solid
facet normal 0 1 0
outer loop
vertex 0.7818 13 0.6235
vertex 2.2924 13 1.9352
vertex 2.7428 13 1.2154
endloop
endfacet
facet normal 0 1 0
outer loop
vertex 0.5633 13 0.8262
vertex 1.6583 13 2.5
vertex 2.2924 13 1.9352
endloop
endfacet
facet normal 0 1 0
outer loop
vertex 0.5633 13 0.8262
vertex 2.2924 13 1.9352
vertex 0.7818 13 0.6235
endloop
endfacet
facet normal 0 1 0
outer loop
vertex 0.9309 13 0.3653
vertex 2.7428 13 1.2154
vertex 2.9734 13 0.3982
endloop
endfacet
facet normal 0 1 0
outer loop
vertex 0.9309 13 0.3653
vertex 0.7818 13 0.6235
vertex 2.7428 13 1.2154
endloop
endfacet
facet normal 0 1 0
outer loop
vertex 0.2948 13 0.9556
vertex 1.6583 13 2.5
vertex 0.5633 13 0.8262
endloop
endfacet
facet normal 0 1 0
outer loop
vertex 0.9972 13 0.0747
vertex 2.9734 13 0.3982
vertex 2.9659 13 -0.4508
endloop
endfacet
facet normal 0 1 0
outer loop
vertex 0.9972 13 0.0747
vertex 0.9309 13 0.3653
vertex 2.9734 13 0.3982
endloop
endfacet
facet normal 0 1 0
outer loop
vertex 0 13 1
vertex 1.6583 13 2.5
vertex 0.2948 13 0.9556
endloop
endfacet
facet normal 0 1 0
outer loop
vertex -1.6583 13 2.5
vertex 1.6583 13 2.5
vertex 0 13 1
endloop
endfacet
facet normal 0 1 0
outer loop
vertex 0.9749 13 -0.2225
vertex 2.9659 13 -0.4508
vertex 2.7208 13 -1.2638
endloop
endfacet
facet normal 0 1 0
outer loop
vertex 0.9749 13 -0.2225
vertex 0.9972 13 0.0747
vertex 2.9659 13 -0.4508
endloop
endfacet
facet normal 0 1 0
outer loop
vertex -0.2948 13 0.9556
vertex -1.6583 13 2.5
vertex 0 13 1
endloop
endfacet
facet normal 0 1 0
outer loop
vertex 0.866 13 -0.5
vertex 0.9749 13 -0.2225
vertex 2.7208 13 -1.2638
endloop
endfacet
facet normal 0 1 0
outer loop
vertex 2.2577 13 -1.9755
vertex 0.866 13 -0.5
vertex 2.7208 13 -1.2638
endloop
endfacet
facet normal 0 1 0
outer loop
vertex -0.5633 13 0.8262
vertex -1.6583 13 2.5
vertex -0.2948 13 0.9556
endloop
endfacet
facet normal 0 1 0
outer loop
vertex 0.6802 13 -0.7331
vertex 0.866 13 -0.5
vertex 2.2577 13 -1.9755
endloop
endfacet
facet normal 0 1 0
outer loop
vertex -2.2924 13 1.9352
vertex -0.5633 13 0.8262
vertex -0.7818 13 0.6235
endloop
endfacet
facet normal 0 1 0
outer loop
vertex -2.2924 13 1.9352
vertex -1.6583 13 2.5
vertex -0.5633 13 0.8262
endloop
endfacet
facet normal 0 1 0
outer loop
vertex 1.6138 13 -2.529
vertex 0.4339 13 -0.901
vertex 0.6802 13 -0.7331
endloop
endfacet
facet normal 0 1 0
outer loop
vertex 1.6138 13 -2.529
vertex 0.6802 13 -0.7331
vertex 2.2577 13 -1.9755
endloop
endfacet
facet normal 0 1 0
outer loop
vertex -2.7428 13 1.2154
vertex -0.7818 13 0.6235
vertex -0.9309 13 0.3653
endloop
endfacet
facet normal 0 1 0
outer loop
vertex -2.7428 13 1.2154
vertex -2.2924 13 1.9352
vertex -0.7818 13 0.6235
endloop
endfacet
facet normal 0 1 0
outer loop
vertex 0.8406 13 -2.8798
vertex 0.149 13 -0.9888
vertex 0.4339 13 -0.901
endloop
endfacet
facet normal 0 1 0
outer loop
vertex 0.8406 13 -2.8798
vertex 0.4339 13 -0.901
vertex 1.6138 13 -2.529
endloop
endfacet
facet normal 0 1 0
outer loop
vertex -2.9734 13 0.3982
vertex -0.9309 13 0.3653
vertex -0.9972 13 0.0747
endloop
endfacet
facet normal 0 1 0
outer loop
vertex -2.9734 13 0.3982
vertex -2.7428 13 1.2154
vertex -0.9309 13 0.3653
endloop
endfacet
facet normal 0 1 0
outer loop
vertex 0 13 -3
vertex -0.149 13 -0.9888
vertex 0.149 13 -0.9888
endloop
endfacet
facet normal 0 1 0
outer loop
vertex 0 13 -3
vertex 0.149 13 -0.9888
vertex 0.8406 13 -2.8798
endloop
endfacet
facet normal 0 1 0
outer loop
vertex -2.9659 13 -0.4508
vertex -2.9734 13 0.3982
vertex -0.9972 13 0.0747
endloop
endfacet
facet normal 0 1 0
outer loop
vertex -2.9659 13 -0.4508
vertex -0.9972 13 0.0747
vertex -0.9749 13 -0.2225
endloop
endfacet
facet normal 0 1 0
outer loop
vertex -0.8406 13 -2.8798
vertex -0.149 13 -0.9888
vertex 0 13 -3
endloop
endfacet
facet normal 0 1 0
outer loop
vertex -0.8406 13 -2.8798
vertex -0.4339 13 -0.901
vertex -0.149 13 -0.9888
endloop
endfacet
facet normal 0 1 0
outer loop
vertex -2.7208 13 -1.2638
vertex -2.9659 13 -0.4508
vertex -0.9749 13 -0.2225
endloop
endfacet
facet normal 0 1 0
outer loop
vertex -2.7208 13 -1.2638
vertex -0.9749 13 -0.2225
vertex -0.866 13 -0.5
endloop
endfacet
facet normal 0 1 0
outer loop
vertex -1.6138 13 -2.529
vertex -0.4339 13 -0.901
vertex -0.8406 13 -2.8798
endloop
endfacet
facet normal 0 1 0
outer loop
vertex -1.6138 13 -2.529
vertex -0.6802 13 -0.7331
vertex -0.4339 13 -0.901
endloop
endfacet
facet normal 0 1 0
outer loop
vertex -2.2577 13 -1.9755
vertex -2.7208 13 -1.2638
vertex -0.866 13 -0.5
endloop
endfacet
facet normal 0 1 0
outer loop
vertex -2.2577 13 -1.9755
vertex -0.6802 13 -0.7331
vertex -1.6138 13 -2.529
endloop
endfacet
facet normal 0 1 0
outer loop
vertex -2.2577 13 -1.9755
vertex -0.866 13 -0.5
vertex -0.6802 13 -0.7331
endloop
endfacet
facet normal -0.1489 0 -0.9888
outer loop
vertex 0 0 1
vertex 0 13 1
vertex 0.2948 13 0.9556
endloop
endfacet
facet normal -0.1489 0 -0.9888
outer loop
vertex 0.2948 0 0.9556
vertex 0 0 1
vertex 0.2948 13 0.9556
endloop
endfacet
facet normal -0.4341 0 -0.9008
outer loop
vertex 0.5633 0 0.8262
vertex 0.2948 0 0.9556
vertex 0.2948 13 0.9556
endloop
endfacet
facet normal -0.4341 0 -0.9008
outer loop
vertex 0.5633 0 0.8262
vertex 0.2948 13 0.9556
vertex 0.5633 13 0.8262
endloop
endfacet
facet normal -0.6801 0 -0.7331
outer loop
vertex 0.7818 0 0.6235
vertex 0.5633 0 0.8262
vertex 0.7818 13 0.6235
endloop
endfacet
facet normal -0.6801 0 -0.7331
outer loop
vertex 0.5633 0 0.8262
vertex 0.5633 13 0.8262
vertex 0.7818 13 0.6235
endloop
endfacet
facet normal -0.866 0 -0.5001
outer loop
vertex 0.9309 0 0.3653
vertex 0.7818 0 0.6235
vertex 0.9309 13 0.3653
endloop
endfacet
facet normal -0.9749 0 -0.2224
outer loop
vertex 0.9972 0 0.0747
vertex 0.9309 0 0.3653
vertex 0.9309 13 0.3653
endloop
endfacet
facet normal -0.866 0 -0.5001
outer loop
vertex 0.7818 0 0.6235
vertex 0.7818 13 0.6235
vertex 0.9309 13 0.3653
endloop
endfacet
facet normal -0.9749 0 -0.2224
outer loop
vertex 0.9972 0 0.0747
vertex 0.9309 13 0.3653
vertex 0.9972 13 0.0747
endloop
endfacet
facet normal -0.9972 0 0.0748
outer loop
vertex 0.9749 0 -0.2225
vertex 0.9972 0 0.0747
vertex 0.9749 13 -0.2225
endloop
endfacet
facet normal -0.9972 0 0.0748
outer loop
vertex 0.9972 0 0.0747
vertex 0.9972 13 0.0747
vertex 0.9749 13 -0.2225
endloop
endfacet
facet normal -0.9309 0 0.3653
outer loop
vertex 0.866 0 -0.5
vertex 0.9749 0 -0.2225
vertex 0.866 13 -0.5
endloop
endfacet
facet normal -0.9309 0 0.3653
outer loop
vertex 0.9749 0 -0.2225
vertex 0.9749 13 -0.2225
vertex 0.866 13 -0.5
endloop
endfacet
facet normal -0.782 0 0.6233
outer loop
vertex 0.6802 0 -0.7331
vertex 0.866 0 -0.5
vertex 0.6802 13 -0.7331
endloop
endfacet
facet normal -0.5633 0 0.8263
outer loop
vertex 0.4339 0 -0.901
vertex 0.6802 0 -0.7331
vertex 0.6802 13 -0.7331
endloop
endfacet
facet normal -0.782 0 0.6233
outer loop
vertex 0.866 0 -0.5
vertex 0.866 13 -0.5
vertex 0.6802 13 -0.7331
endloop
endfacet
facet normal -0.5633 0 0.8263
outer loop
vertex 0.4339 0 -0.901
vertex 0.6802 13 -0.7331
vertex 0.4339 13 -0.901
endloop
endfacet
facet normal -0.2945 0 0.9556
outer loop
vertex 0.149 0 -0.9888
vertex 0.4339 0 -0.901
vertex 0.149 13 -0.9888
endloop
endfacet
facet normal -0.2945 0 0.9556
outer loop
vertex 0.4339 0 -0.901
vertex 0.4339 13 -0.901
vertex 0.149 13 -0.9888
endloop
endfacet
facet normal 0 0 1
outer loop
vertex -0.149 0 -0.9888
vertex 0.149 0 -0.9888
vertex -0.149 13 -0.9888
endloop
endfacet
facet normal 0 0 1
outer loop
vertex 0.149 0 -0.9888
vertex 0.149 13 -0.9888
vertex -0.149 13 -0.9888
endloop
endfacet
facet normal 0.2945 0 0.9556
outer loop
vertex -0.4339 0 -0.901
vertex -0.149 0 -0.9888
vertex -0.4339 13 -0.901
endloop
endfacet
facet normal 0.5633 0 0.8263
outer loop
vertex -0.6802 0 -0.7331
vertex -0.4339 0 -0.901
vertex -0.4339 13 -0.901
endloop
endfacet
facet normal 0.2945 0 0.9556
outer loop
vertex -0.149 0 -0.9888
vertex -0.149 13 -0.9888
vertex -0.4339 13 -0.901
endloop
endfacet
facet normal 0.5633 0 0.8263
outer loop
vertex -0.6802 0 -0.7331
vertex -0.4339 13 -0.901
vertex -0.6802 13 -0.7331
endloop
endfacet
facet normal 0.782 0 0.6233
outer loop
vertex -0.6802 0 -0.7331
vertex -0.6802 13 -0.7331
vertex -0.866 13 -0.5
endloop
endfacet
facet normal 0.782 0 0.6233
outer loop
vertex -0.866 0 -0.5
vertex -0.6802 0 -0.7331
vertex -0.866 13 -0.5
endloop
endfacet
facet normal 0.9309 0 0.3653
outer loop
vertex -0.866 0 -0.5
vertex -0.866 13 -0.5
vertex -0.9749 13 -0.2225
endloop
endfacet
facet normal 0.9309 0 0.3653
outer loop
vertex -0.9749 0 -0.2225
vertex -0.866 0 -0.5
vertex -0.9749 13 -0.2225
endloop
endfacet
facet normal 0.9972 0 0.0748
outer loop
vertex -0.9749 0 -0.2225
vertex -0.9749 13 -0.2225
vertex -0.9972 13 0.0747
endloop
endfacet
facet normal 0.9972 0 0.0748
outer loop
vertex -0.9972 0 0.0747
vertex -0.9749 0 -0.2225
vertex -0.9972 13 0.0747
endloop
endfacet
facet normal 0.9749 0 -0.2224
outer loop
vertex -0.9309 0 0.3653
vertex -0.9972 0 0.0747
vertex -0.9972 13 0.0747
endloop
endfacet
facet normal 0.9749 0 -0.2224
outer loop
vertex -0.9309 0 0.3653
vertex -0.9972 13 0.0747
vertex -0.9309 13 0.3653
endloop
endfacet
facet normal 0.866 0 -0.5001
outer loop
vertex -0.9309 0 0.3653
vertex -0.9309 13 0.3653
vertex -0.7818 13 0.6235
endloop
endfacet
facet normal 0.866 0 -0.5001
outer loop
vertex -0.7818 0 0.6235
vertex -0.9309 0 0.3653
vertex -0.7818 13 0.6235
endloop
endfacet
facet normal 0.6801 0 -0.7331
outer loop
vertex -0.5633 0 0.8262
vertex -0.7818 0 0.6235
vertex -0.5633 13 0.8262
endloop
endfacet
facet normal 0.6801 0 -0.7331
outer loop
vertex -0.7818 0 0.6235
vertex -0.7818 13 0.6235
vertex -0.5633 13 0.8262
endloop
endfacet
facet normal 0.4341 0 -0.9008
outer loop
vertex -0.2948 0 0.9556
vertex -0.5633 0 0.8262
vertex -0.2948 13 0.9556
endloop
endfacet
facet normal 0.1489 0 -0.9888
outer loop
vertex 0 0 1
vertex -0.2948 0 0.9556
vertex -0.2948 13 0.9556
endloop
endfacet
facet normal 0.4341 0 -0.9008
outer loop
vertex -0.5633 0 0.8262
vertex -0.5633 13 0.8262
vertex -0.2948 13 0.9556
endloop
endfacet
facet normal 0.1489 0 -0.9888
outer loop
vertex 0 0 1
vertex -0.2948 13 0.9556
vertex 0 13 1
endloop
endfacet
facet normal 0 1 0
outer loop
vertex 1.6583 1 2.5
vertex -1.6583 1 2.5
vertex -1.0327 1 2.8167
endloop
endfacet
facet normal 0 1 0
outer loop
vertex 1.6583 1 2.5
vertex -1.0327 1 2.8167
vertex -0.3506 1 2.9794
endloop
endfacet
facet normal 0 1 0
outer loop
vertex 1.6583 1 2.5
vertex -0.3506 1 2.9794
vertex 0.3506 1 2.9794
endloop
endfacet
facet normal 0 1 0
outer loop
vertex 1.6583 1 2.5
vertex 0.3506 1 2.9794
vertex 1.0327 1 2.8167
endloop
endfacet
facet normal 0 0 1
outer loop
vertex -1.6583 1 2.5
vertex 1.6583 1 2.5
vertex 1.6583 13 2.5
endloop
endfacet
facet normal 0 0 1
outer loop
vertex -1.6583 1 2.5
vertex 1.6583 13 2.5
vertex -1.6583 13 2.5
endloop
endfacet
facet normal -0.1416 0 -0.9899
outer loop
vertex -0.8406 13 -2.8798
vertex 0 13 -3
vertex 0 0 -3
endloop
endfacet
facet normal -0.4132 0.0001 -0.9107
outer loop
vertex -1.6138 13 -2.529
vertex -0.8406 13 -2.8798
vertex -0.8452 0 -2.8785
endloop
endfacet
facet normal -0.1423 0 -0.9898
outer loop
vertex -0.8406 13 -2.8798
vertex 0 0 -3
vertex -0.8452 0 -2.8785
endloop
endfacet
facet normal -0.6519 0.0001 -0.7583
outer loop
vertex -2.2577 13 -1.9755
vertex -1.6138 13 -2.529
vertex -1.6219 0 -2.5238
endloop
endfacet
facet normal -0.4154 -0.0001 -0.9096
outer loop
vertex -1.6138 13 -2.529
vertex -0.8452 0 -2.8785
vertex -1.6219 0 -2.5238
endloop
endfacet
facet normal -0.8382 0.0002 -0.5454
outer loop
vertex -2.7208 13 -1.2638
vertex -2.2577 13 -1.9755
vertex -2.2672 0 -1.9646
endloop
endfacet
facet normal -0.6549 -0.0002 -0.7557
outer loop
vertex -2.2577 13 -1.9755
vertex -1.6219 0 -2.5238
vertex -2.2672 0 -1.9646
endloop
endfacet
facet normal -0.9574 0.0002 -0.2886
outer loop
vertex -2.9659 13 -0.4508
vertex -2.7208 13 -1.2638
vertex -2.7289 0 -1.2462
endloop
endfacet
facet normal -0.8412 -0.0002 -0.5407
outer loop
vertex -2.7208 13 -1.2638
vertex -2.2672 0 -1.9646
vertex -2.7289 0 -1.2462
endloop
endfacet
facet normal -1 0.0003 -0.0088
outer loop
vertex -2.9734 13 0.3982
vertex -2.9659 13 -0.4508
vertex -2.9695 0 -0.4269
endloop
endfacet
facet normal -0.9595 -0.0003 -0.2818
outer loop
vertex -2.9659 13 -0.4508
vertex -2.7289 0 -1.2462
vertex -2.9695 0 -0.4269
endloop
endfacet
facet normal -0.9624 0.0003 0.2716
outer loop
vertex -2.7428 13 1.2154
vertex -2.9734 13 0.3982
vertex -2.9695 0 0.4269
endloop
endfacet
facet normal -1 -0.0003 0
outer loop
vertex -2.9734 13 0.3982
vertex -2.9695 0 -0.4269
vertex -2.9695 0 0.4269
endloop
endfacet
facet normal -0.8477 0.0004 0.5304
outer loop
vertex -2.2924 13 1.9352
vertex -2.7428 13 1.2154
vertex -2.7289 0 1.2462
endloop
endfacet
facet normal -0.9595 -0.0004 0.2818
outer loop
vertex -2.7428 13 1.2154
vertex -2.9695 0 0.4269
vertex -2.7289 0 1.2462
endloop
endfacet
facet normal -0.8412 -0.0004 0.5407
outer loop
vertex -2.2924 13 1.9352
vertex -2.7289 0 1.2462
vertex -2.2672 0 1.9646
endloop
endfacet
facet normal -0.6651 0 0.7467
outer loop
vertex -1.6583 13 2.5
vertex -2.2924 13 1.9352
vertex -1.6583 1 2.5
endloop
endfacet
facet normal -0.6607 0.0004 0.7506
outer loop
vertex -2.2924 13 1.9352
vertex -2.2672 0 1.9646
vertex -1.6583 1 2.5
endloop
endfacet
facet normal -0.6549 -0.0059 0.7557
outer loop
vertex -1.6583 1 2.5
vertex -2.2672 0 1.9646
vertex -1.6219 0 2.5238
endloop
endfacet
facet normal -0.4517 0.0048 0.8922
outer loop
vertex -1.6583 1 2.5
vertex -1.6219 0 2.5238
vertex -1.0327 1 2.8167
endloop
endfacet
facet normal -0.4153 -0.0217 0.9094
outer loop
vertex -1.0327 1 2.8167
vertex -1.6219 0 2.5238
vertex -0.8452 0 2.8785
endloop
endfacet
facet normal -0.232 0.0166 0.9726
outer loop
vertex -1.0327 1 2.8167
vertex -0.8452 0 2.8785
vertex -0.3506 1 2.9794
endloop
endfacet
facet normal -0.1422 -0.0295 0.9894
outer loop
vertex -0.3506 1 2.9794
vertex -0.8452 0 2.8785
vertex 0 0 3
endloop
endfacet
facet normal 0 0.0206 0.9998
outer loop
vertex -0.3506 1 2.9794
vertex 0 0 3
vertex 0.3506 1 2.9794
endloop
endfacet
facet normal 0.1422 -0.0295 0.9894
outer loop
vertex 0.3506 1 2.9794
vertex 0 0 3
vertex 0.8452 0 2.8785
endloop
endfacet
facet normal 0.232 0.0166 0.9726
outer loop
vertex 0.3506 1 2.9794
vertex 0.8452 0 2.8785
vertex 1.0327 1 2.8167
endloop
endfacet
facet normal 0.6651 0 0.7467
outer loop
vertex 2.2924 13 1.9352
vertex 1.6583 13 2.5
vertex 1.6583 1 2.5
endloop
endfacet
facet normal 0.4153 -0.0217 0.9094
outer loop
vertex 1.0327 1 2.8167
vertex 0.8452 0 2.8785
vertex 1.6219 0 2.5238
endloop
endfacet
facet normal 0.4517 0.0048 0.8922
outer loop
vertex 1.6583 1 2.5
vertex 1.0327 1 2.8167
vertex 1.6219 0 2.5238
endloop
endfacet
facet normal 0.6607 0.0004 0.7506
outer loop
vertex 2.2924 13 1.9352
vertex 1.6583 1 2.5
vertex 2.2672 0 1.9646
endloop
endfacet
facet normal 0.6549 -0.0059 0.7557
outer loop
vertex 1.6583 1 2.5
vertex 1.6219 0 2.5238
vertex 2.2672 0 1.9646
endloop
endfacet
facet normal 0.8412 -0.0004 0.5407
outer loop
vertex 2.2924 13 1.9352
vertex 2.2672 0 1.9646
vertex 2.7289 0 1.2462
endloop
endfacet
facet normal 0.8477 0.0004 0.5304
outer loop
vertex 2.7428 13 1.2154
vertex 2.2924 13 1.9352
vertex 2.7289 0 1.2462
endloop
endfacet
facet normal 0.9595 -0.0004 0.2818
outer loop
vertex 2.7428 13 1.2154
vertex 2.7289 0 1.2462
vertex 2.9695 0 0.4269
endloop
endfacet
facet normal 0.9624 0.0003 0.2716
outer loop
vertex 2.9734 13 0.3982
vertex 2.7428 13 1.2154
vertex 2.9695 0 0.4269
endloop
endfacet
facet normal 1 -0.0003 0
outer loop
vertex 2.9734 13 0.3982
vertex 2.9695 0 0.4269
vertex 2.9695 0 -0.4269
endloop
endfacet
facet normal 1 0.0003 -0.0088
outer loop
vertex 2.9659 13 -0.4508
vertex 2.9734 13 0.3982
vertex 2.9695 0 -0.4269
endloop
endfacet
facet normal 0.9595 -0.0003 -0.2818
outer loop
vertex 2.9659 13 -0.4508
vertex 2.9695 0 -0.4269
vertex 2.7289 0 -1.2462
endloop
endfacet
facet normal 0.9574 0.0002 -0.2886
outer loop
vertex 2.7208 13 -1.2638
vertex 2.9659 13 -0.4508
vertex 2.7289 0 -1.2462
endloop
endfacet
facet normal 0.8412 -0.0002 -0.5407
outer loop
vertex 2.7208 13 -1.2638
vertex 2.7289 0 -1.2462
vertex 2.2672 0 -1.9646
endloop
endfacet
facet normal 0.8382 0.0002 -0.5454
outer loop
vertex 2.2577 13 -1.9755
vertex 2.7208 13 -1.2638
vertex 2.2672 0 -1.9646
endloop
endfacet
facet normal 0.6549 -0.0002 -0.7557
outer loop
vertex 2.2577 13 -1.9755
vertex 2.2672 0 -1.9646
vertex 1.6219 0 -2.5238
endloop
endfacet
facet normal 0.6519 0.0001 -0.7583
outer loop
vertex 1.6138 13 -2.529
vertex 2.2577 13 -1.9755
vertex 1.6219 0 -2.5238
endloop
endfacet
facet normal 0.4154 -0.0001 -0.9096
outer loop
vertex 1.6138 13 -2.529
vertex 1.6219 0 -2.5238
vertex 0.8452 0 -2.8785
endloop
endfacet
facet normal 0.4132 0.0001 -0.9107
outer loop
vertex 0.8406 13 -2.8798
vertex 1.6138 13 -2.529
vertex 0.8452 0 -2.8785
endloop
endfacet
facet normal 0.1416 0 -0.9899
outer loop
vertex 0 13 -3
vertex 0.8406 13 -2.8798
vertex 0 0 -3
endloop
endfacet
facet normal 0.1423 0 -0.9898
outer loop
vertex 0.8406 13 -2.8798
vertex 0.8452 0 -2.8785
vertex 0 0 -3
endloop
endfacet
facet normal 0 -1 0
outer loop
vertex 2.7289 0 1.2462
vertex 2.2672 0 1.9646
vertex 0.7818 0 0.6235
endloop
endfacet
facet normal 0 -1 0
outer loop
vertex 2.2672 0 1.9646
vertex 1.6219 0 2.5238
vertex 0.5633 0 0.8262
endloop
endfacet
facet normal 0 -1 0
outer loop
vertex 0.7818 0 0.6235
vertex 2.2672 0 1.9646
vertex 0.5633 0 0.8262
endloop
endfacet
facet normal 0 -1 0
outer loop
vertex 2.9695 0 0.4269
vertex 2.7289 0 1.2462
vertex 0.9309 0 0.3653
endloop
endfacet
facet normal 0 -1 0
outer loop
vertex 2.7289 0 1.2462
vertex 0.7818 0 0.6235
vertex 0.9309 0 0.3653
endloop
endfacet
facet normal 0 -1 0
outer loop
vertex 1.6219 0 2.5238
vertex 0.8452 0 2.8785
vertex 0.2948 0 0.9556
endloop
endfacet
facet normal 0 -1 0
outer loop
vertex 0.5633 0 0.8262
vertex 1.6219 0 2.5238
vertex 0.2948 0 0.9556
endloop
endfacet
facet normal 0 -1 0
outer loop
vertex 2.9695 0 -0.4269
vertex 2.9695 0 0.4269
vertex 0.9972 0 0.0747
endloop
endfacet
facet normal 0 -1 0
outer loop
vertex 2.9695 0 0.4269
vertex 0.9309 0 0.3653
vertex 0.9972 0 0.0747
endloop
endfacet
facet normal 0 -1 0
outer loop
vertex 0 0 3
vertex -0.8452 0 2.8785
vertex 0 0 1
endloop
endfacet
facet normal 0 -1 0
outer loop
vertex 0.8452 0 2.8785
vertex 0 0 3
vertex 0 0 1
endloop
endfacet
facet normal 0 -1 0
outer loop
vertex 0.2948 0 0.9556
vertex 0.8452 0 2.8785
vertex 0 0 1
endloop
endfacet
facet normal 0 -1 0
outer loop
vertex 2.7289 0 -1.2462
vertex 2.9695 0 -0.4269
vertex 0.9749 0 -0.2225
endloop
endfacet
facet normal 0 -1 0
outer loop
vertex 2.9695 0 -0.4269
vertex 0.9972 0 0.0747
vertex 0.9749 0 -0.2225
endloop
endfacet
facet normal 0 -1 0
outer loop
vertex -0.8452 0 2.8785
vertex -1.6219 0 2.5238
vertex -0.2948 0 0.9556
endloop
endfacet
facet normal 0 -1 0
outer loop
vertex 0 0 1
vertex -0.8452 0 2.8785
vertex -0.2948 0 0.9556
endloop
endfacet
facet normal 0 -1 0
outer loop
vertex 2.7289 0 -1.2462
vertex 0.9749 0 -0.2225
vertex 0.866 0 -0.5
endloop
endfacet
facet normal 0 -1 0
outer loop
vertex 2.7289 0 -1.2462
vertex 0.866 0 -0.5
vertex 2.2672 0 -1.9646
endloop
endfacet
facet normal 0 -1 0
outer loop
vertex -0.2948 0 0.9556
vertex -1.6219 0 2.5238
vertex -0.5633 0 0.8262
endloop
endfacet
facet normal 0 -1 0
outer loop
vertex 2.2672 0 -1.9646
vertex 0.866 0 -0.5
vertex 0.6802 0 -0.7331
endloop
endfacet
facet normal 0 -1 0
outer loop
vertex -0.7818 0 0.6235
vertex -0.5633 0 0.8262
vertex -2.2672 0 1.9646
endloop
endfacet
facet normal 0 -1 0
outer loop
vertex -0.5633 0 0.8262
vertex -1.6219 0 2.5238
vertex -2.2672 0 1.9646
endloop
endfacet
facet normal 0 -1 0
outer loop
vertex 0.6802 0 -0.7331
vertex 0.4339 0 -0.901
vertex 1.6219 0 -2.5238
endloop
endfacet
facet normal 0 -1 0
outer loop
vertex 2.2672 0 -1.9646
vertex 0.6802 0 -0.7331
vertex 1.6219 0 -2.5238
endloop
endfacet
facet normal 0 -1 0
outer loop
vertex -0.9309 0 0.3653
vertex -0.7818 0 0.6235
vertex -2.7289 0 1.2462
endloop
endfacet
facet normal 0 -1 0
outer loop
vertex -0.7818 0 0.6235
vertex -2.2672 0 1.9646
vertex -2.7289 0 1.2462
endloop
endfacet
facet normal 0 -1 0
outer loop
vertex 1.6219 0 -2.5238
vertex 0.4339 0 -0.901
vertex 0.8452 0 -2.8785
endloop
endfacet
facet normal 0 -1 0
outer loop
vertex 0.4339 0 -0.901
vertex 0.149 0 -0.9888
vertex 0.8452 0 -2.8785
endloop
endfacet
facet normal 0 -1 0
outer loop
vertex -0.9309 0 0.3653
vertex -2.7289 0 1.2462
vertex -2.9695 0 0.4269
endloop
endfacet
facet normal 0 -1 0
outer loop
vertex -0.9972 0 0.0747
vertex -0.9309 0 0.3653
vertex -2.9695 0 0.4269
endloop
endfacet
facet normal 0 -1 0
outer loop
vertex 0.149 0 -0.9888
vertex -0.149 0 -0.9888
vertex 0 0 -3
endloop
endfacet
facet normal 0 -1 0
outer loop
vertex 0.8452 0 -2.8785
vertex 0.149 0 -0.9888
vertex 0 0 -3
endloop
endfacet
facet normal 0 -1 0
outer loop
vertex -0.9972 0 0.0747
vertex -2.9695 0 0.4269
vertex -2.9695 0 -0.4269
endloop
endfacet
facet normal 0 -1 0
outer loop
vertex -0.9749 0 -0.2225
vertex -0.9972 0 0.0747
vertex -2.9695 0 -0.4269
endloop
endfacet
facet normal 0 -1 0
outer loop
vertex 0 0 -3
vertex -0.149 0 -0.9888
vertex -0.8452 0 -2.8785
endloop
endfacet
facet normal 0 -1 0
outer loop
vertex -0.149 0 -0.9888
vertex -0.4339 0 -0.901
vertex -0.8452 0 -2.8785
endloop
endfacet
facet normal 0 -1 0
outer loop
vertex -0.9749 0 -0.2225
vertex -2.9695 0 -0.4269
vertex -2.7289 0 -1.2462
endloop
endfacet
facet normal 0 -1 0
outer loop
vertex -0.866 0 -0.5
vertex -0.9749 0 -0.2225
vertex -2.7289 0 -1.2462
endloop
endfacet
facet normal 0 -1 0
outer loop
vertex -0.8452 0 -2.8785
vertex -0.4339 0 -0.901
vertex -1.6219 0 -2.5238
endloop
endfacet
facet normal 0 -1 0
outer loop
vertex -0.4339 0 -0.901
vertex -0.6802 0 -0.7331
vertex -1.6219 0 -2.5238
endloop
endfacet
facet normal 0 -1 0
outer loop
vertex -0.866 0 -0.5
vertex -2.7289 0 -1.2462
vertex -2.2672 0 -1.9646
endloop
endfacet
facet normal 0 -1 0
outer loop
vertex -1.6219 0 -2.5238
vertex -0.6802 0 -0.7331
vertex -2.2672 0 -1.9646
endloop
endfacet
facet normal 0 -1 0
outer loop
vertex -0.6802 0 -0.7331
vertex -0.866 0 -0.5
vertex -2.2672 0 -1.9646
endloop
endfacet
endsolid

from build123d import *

# Parameters (mm, degrees)
SKETCH1_R           = 3
BOSS_EXTRUDE1_DEPTH = 13
SKETCH2_R           = 1
CUT_EXTRUDE1_DEPTH  = 13
CUT_EXTRUDE2_DEPTH  = 12


with BuildPart() as part:
    # Sketch1 → Boss-Extrude1 (new body)
    with BuildSketch(Plane(origin=(0, 0, 0), x_dir=(1, 0, 0), z_dir=(0, 1, 0))):
        with Locations(Location((0, 0, 0), (0, 0, 90))):
            Circle(SKETCH1_R)
    extrude(amount=BOSS_EXTRUDE1_DEPTH)

    # Sketch2 → Cut-Extrude1 (cut)
    with BuildSketch(Plane(origin=(0, 13, 0), x_dir=(1, 0, 0), z_dir=(0, 1, 0))):
        with Locations(Location((0, 0, 0), (0, 0, 270))):
            Circle(SKETCH2_R)
    extrude(amount=-CUT_EXTRUDE1_DEPTH, mode=Mode.SUBTRACT)

    # Sketch3 → Cut-Extrude2 (cut)
    with BuildSketch(Plane(origin=(0, 13, 0), x_dir=(1, 0, 0), z_dir=(0, 1, 0))):
        Polygon((26.073564647, -2.5), (1.658312395, -2.5), (-1.658312395, -2.5), (-26.073564647, -2.5), (-26.073564647, -51.330504504), (26.073564647, -51.330504504), align=None)
    extrude(amount=-CUT_EXTRUDE2_DEPTH, mode=Mode.SUBTRACT)


solid = part.part
